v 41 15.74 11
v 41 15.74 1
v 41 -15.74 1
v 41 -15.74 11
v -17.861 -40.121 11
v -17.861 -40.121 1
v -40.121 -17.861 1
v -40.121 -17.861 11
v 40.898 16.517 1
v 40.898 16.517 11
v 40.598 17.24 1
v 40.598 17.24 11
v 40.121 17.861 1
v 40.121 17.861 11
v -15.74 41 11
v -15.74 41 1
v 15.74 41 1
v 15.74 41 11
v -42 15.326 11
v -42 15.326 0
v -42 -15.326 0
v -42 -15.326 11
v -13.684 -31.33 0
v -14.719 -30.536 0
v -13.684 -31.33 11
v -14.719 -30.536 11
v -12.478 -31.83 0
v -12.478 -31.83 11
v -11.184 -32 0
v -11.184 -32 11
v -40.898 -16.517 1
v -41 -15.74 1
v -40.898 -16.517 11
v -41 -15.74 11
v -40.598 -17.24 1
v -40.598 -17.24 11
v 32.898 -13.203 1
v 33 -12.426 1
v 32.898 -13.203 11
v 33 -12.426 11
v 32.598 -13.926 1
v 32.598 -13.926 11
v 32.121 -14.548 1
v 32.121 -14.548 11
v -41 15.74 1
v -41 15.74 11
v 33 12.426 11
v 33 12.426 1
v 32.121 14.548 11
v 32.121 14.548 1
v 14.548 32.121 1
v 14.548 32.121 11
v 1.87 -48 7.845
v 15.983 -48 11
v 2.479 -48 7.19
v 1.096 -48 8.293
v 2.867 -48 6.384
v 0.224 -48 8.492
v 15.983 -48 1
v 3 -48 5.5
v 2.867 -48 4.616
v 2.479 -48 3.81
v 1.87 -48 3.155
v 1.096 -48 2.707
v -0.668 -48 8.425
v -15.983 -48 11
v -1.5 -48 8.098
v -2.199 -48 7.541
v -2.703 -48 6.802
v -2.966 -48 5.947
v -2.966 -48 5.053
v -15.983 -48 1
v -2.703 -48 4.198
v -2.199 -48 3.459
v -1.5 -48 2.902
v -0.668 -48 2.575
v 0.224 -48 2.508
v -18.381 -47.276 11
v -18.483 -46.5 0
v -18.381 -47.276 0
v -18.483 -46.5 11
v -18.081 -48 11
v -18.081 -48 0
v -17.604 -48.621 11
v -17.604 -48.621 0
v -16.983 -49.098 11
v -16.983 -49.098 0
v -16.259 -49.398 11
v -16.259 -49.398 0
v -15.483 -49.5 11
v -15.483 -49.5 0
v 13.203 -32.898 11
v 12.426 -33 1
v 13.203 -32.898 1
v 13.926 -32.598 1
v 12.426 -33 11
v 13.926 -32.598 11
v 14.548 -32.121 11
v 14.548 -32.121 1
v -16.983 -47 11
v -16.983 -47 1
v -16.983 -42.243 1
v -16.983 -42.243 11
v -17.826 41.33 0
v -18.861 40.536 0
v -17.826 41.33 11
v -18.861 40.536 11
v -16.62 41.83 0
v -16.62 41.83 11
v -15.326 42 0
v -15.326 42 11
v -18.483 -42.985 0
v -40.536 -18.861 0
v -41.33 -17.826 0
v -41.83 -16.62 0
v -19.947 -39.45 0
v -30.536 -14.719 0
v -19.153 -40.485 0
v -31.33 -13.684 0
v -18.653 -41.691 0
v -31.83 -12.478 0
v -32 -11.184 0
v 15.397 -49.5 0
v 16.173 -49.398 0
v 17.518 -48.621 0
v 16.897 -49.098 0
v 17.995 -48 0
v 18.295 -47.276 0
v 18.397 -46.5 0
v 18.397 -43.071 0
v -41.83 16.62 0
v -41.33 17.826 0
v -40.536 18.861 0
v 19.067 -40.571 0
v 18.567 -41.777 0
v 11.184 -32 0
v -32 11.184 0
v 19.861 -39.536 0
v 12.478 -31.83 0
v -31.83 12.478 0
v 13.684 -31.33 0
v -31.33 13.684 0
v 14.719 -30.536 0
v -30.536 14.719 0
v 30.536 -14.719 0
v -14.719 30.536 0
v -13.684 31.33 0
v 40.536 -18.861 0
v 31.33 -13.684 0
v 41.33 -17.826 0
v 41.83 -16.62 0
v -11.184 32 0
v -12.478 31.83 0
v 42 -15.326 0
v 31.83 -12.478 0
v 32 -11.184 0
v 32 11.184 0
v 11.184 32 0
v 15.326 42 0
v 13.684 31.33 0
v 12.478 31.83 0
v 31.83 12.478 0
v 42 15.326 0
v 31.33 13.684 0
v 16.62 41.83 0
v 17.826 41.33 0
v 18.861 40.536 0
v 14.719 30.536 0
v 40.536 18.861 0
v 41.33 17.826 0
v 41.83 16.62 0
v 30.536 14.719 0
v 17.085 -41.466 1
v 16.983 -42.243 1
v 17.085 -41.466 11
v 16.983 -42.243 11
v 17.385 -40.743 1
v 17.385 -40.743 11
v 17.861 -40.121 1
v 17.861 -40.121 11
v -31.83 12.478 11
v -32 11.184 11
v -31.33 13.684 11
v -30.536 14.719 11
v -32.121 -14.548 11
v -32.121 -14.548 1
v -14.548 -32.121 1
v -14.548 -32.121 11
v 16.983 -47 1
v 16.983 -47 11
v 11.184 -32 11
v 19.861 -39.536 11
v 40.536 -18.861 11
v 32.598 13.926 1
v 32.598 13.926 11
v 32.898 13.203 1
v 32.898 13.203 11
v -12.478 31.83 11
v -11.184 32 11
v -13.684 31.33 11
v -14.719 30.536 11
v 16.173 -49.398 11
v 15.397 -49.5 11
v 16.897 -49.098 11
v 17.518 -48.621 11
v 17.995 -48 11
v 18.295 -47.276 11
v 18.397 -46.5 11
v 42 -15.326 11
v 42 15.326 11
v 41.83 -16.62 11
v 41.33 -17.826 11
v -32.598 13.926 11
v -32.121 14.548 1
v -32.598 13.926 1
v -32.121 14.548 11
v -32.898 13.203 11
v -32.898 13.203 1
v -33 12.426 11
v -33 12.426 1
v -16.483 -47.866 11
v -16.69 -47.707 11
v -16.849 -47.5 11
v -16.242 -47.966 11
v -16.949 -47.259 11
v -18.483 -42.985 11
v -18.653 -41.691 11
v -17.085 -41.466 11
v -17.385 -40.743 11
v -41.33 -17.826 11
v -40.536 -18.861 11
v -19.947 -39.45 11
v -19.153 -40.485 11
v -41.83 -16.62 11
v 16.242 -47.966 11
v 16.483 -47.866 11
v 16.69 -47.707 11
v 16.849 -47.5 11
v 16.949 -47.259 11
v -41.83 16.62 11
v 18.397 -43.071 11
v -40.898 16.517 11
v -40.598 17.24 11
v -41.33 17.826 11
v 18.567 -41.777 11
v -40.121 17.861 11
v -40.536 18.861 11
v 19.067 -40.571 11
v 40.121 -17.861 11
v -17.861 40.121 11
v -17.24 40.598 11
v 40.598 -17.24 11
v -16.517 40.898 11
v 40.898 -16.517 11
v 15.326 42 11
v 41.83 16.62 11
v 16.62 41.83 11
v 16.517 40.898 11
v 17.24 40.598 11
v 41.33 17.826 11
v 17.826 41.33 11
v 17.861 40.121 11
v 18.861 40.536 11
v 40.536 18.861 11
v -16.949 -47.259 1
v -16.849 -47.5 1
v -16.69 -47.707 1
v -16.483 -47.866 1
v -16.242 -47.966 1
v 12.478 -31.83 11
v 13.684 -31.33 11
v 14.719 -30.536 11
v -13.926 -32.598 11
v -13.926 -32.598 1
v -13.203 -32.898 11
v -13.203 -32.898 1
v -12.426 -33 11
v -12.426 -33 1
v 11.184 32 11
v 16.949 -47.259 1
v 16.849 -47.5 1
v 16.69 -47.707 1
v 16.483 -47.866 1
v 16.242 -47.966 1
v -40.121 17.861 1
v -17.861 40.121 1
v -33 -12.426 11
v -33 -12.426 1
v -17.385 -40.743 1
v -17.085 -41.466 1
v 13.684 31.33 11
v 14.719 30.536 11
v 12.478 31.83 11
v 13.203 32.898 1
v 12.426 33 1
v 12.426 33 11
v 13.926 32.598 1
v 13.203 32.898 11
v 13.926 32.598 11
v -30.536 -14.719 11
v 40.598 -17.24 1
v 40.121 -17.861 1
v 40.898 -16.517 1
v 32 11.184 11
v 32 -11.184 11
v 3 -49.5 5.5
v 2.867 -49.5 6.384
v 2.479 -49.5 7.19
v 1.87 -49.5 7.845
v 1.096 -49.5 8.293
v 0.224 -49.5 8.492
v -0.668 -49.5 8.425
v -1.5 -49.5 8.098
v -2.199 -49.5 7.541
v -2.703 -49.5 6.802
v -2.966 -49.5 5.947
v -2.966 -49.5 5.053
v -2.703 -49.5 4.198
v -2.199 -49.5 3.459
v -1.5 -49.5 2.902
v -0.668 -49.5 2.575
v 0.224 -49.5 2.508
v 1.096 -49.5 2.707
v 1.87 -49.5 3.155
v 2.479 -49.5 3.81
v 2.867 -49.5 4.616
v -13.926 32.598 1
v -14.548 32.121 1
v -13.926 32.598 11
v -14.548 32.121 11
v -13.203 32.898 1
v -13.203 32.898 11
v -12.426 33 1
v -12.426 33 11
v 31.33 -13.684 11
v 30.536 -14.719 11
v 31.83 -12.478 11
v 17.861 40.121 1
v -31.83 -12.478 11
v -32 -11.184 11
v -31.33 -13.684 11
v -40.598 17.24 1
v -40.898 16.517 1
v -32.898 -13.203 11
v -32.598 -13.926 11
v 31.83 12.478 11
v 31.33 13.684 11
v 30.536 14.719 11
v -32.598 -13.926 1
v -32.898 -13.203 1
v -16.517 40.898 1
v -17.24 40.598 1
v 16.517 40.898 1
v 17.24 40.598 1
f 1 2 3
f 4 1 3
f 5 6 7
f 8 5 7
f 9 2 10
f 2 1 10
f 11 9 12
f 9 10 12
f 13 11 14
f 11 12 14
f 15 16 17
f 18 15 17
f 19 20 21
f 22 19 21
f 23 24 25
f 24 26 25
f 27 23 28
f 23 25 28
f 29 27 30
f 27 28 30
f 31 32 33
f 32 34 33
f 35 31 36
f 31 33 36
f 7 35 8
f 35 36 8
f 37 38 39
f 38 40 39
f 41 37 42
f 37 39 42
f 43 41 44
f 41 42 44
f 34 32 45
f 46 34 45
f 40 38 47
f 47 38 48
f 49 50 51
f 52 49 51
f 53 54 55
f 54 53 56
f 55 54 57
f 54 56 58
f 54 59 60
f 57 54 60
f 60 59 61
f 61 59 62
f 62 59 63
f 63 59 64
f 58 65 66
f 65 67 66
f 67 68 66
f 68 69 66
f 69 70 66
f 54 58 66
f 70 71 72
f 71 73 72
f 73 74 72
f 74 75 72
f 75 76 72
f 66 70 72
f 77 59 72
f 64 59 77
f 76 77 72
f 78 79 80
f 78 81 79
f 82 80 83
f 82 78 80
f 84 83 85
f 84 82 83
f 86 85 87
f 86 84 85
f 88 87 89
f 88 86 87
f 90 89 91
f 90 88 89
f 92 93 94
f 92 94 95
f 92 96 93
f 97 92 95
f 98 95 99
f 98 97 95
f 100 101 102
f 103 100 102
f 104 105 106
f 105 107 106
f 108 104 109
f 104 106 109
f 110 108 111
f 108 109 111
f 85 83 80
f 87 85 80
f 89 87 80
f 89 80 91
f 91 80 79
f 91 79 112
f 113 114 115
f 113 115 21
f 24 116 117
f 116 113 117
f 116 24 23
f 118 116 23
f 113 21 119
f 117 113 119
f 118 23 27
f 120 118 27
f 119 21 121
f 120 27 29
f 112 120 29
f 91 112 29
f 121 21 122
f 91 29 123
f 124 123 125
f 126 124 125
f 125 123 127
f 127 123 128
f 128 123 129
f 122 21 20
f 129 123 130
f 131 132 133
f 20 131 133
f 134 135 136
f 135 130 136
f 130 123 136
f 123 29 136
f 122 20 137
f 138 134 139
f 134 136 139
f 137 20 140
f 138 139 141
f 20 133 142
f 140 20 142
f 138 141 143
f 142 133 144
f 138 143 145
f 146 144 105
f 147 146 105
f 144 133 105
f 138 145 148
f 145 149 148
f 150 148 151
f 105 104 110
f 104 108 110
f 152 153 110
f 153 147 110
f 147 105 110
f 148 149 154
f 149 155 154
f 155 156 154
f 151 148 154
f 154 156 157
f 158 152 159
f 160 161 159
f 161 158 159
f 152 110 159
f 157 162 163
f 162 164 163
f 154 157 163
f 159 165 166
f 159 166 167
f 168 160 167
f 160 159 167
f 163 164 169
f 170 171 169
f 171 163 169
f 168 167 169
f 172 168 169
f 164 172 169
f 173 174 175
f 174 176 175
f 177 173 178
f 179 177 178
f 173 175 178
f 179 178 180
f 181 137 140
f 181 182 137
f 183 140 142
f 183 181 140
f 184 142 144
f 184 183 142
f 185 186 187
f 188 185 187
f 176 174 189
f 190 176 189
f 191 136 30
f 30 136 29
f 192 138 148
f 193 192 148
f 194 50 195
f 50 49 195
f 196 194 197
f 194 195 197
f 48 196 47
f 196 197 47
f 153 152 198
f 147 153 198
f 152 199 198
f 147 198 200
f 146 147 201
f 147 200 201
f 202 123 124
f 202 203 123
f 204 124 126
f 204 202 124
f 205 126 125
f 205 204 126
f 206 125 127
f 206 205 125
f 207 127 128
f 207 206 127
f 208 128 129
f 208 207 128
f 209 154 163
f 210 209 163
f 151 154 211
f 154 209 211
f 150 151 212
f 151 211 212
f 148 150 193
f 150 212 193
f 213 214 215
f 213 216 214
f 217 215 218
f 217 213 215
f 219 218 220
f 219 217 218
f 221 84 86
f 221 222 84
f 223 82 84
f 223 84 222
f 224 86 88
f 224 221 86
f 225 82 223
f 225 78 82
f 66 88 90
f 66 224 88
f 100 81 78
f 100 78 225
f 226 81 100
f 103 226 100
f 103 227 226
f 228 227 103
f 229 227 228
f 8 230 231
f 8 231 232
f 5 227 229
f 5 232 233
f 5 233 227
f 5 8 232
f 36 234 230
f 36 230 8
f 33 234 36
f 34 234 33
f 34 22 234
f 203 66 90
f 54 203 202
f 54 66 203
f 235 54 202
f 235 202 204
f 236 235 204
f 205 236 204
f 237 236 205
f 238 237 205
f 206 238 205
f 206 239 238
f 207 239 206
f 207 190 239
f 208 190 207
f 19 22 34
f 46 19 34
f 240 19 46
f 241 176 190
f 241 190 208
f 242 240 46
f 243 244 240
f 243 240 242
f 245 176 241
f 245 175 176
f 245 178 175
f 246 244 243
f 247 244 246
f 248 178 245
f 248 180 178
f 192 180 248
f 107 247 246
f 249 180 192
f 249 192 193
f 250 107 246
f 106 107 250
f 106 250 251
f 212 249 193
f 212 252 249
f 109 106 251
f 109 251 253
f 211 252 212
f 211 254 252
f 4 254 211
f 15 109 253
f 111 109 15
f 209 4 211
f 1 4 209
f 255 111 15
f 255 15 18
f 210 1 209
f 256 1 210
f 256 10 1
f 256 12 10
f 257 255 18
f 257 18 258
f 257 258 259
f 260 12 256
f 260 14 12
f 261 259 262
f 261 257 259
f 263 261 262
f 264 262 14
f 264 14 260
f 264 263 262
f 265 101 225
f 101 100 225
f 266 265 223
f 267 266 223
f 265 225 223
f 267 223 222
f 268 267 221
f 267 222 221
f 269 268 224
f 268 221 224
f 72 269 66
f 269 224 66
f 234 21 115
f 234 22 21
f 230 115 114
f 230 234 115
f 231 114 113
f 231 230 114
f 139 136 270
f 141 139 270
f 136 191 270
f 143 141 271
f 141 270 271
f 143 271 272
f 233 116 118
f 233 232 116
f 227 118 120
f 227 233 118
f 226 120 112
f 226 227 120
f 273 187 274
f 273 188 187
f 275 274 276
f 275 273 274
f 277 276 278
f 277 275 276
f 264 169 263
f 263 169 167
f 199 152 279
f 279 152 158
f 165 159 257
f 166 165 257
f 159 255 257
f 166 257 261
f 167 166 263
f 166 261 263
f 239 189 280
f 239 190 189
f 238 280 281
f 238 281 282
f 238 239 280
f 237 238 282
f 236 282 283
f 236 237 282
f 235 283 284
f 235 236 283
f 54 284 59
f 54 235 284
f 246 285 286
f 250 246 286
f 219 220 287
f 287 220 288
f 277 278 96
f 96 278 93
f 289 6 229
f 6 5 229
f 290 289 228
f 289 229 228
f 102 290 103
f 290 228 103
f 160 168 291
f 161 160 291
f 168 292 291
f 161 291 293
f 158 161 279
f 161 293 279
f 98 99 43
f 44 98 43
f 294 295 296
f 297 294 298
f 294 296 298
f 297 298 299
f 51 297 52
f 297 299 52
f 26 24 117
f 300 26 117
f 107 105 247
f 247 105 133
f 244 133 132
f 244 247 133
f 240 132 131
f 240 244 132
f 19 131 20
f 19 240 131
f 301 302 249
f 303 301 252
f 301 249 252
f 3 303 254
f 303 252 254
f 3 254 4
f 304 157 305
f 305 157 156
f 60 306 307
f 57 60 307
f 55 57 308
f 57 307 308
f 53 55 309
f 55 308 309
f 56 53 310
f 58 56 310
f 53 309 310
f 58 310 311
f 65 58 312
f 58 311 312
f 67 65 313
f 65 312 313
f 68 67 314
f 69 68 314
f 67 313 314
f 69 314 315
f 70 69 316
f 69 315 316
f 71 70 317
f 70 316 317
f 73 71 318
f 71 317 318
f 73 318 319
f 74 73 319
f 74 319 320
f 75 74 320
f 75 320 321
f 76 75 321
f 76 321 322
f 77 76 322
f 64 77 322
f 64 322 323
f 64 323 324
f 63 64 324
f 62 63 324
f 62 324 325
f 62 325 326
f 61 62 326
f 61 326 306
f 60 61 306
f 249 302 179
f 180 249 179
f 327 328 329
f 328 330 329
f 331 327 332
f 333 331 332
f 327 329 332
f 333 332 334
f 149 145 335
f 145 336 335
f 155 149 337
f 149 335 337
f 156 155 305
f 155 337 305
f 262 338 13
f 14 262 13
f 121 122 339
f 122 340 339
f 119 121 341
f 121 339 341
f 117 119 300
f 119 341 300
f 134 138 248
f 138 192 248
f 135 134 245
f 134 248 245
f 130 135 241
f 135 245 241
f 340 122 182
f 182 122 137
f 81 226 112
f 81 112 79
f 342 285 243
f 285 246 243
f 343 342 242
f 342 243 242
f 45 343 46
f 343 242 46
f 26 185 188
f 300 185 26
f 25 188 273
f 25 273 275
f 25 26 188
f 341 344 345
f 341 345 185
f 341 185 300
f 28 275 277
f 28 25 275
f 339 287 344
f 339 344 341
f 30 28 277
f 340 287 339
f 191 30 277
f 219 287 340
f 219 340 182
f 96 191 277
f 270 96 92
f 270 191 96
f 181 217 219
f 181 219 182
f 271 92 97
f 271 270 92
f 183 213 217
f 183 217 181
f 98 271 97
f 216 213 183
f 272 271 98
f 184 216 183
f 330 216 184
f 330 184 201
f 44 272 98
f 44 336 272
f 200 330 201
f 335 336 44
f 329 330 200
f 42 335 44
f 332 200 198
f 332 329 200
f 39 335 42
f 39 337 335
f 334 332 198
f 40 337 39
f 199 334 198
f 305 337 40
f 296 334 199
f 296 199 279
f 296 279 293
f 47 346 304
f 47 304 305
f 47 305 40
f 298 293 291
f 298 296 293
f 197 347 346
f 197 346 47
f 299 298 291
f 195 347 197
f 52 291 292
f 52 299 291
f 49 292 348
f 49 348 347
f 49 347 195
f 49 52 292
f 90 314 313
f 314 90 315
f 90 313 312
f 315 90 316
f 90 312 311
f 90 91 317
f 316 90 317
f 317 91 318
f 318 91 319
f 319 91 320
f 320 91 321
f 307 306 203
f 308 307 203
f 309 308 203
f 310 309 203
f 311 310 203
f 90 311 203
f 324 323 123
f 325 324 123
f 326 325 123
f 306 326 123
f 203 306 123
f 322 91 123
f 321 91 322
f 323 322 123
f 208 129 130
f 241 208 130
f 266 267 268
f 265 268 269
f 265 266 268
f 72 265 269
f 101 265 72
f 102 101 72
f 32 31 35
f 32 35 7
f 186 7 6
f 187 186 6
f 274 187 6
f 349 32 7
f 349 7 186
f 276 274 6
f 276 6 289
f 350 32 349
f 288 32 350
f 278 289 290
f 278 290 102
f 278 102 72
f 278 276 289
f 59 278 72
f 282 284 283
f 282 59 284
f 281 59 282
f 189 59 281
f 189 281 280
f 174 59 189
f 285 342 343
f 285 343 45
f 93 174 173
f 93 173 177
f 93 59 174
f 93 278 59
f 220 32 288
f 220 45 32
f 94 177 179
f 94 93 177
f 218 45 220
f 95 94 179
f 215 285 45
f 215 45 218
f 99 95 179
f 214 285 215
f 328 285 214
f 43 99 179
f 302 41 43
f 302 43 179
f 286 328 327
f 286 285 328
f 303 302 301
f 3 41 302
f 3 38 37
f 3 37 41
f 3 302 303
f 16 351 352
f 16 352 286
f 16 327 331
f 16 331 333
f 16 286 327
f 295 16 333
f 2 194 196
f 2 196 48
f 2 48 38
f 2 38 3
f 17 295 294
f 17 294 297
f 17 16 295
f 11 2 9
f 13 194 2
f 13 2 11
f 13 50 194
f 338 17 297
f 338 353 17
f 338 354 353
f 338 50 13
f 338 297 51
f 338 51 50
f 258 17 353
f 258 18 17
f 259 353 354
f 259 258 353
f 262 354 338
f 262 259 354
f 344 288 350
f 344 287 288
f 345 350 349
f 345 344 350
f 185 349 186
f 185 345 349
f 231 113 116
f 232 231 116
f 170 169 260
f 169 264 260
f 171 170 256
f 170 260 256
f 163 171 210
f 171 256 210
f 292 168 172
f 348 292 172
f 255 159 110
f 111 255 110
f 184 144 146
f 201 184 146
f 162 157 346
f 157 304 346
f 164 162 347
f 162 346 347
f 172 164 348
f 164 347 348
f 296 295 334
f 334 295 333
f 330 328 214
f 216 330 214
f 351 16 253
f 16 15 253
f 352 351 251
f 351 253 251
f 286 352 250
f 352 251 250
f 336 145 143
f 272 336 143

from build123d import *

# Parameters (mm, degrees)
F1_DEPTH = 1
F2_DEPTH = 11
F3_R     = 5
F4_R     = 3
F5_R     = 3
F6_DEPTH = 2
F7_R     = 1


with BuildPart() as f1:
    # F0 (on Top) → F1 (new body)
    with BuildSketch(Plane.XY):
        Polygon((41, -16.9827560573), (41, 16.9827560573), (16.9827560573, 41), (-16.9827560573, 41), (-41, 16.9827560573), (-41, -16.9827560573), (-16.9827560573, -41), (-16.9827560573, -48), (16.9827560573, -48), (16.9827560573, -41), align=None)
        Polygon((-33, -13.6690475583), (-33, 13.6690475583), (-13.6690475583, 33), (13.6690475583, 33), (33, 13.6690475583), (33, -13.6690475583), (13.6690475583, -33), (-13.6690475583, -33), align=None, mode=Mode.SUBTRACT)
    extrude(amount=F1_DEPTH)

    # F0 (on Top) → F2 (join)
    with BuildSketch(Plane.XY):
        Polygon((-17.3969696197, 42), (-42, 17.3969696197), (-42, -17.3969696197), (-18.4827560573, -40.9142135624), (-18.4827560573, -49.5), (18.3969696197, -49.5), (18.3969696197, -41), (42, -17.3969696197), (42, 17.3969696197), (17.3969696197, 42), align=None)
        Polygon((16.9827560573, 41), (41, 16.9827560573), (41, -16.9827560573), (16.9827560573, -41), (16.9827560573, -48), (-16.9827560573, -48), (-16.9827560573, -41), (-41, -16.9827560573), (-41, 16.9827560573), (-16.9827560573, 41), align=None, mode=Mode.SUBTRACT)
        Polygon((-13.6690475583, 33), (-33, 13.6690475583), (-33, -13.6690475583), (-13.6690475583, -33), (13.6690475583, -33), (33, -13.6690475583), (33, 13.6690475583), (13.6690475583, 33), align=None)
        Polygon((-32, 13.2548339959), (-13.2548339959, 32), (13.2548339959, 32), (32, 13.2548339959), (32, -13.2548339959), (13.2548339959, -32), (-13.2548339959, -32), (-32, -13.2548339959), align=None, mode=Mode.SUBTRACT)
    extrude(amount=F2_DEPTH)

    # F3
    f3_edges = [f1.edges().sort_by_distance(p)[0] for p in [
        (-42, 17.39697, 5.5),
        (-42, -17.39697, 5.5),
        (-17.39697, 42, 5.5),
        (17.39697, 42, 5.5),
        (42, 17.39697, 5.5),
        (42, -17.39697, 5.5),
        (-13.254834, 32, 5.5),
        (-32, 13.254834, 5.5),
        (-32, -13.254834, 5.5),
        (-13.254834, -32, 5.5),
        (13.254834, -32, 5.5),
        (32, -13.254834, 5.5),
        (32, 13.254834, 5.5),
        (13.254834, 32, 5.5),
        (18.39697, -41, 5.5),
        (-18.482756, -40.914214, 5.5),
    ]]
    fillet(f3_edges, radius=F3_R)

    # F4
    f4_edges = [f1.edges().sort_by_distance(p)[0] for p in [
        (-33, -13.669048, 6),
        (-13.669048, -33, 6),
        (13.669048, -33, 6),
        (33, -13.669048, 6),
        (33, 13.669048, 6),
        (13.669048, 33, 6),
        (-13.669048, 33, 6),
        (-33, 13.669048, 6),
        (41, -16.982756, 6),
        (41, 16.982756, 6),
        (16.982756, 41, 6),
        (-16.982756, 41, 6),
        (-41, 16.982756, 6),
        (-41, -16.982756, 6),
        (-16.982756, -41, 6),
        (16.982756, -41, 6),
        (18.39697, -49.5, 5.5),
        (-18.482756, -49.5, 5.5),
    ]]
    fillet(f4_edges, radius=F4_R)

    # F5 (on face) → F6 (cut)
    with BuildSketch(Plane.XZ.offset(49.5)):
        with Locations((0, 5.5)):
            Circle(F5_R)
    extrude(amount=-F6_DEPTH, mode=Mode.SUBTRACT)

    # F7
    f7_edges = [f1.edges().sort_by_distance(p)[0] for p in [
        (-16.982756, -48, 6),
        (16.982756, -48, 6),
    ]]
    fillet(f7_edges, radius=F7_R)


solid = f1.part
